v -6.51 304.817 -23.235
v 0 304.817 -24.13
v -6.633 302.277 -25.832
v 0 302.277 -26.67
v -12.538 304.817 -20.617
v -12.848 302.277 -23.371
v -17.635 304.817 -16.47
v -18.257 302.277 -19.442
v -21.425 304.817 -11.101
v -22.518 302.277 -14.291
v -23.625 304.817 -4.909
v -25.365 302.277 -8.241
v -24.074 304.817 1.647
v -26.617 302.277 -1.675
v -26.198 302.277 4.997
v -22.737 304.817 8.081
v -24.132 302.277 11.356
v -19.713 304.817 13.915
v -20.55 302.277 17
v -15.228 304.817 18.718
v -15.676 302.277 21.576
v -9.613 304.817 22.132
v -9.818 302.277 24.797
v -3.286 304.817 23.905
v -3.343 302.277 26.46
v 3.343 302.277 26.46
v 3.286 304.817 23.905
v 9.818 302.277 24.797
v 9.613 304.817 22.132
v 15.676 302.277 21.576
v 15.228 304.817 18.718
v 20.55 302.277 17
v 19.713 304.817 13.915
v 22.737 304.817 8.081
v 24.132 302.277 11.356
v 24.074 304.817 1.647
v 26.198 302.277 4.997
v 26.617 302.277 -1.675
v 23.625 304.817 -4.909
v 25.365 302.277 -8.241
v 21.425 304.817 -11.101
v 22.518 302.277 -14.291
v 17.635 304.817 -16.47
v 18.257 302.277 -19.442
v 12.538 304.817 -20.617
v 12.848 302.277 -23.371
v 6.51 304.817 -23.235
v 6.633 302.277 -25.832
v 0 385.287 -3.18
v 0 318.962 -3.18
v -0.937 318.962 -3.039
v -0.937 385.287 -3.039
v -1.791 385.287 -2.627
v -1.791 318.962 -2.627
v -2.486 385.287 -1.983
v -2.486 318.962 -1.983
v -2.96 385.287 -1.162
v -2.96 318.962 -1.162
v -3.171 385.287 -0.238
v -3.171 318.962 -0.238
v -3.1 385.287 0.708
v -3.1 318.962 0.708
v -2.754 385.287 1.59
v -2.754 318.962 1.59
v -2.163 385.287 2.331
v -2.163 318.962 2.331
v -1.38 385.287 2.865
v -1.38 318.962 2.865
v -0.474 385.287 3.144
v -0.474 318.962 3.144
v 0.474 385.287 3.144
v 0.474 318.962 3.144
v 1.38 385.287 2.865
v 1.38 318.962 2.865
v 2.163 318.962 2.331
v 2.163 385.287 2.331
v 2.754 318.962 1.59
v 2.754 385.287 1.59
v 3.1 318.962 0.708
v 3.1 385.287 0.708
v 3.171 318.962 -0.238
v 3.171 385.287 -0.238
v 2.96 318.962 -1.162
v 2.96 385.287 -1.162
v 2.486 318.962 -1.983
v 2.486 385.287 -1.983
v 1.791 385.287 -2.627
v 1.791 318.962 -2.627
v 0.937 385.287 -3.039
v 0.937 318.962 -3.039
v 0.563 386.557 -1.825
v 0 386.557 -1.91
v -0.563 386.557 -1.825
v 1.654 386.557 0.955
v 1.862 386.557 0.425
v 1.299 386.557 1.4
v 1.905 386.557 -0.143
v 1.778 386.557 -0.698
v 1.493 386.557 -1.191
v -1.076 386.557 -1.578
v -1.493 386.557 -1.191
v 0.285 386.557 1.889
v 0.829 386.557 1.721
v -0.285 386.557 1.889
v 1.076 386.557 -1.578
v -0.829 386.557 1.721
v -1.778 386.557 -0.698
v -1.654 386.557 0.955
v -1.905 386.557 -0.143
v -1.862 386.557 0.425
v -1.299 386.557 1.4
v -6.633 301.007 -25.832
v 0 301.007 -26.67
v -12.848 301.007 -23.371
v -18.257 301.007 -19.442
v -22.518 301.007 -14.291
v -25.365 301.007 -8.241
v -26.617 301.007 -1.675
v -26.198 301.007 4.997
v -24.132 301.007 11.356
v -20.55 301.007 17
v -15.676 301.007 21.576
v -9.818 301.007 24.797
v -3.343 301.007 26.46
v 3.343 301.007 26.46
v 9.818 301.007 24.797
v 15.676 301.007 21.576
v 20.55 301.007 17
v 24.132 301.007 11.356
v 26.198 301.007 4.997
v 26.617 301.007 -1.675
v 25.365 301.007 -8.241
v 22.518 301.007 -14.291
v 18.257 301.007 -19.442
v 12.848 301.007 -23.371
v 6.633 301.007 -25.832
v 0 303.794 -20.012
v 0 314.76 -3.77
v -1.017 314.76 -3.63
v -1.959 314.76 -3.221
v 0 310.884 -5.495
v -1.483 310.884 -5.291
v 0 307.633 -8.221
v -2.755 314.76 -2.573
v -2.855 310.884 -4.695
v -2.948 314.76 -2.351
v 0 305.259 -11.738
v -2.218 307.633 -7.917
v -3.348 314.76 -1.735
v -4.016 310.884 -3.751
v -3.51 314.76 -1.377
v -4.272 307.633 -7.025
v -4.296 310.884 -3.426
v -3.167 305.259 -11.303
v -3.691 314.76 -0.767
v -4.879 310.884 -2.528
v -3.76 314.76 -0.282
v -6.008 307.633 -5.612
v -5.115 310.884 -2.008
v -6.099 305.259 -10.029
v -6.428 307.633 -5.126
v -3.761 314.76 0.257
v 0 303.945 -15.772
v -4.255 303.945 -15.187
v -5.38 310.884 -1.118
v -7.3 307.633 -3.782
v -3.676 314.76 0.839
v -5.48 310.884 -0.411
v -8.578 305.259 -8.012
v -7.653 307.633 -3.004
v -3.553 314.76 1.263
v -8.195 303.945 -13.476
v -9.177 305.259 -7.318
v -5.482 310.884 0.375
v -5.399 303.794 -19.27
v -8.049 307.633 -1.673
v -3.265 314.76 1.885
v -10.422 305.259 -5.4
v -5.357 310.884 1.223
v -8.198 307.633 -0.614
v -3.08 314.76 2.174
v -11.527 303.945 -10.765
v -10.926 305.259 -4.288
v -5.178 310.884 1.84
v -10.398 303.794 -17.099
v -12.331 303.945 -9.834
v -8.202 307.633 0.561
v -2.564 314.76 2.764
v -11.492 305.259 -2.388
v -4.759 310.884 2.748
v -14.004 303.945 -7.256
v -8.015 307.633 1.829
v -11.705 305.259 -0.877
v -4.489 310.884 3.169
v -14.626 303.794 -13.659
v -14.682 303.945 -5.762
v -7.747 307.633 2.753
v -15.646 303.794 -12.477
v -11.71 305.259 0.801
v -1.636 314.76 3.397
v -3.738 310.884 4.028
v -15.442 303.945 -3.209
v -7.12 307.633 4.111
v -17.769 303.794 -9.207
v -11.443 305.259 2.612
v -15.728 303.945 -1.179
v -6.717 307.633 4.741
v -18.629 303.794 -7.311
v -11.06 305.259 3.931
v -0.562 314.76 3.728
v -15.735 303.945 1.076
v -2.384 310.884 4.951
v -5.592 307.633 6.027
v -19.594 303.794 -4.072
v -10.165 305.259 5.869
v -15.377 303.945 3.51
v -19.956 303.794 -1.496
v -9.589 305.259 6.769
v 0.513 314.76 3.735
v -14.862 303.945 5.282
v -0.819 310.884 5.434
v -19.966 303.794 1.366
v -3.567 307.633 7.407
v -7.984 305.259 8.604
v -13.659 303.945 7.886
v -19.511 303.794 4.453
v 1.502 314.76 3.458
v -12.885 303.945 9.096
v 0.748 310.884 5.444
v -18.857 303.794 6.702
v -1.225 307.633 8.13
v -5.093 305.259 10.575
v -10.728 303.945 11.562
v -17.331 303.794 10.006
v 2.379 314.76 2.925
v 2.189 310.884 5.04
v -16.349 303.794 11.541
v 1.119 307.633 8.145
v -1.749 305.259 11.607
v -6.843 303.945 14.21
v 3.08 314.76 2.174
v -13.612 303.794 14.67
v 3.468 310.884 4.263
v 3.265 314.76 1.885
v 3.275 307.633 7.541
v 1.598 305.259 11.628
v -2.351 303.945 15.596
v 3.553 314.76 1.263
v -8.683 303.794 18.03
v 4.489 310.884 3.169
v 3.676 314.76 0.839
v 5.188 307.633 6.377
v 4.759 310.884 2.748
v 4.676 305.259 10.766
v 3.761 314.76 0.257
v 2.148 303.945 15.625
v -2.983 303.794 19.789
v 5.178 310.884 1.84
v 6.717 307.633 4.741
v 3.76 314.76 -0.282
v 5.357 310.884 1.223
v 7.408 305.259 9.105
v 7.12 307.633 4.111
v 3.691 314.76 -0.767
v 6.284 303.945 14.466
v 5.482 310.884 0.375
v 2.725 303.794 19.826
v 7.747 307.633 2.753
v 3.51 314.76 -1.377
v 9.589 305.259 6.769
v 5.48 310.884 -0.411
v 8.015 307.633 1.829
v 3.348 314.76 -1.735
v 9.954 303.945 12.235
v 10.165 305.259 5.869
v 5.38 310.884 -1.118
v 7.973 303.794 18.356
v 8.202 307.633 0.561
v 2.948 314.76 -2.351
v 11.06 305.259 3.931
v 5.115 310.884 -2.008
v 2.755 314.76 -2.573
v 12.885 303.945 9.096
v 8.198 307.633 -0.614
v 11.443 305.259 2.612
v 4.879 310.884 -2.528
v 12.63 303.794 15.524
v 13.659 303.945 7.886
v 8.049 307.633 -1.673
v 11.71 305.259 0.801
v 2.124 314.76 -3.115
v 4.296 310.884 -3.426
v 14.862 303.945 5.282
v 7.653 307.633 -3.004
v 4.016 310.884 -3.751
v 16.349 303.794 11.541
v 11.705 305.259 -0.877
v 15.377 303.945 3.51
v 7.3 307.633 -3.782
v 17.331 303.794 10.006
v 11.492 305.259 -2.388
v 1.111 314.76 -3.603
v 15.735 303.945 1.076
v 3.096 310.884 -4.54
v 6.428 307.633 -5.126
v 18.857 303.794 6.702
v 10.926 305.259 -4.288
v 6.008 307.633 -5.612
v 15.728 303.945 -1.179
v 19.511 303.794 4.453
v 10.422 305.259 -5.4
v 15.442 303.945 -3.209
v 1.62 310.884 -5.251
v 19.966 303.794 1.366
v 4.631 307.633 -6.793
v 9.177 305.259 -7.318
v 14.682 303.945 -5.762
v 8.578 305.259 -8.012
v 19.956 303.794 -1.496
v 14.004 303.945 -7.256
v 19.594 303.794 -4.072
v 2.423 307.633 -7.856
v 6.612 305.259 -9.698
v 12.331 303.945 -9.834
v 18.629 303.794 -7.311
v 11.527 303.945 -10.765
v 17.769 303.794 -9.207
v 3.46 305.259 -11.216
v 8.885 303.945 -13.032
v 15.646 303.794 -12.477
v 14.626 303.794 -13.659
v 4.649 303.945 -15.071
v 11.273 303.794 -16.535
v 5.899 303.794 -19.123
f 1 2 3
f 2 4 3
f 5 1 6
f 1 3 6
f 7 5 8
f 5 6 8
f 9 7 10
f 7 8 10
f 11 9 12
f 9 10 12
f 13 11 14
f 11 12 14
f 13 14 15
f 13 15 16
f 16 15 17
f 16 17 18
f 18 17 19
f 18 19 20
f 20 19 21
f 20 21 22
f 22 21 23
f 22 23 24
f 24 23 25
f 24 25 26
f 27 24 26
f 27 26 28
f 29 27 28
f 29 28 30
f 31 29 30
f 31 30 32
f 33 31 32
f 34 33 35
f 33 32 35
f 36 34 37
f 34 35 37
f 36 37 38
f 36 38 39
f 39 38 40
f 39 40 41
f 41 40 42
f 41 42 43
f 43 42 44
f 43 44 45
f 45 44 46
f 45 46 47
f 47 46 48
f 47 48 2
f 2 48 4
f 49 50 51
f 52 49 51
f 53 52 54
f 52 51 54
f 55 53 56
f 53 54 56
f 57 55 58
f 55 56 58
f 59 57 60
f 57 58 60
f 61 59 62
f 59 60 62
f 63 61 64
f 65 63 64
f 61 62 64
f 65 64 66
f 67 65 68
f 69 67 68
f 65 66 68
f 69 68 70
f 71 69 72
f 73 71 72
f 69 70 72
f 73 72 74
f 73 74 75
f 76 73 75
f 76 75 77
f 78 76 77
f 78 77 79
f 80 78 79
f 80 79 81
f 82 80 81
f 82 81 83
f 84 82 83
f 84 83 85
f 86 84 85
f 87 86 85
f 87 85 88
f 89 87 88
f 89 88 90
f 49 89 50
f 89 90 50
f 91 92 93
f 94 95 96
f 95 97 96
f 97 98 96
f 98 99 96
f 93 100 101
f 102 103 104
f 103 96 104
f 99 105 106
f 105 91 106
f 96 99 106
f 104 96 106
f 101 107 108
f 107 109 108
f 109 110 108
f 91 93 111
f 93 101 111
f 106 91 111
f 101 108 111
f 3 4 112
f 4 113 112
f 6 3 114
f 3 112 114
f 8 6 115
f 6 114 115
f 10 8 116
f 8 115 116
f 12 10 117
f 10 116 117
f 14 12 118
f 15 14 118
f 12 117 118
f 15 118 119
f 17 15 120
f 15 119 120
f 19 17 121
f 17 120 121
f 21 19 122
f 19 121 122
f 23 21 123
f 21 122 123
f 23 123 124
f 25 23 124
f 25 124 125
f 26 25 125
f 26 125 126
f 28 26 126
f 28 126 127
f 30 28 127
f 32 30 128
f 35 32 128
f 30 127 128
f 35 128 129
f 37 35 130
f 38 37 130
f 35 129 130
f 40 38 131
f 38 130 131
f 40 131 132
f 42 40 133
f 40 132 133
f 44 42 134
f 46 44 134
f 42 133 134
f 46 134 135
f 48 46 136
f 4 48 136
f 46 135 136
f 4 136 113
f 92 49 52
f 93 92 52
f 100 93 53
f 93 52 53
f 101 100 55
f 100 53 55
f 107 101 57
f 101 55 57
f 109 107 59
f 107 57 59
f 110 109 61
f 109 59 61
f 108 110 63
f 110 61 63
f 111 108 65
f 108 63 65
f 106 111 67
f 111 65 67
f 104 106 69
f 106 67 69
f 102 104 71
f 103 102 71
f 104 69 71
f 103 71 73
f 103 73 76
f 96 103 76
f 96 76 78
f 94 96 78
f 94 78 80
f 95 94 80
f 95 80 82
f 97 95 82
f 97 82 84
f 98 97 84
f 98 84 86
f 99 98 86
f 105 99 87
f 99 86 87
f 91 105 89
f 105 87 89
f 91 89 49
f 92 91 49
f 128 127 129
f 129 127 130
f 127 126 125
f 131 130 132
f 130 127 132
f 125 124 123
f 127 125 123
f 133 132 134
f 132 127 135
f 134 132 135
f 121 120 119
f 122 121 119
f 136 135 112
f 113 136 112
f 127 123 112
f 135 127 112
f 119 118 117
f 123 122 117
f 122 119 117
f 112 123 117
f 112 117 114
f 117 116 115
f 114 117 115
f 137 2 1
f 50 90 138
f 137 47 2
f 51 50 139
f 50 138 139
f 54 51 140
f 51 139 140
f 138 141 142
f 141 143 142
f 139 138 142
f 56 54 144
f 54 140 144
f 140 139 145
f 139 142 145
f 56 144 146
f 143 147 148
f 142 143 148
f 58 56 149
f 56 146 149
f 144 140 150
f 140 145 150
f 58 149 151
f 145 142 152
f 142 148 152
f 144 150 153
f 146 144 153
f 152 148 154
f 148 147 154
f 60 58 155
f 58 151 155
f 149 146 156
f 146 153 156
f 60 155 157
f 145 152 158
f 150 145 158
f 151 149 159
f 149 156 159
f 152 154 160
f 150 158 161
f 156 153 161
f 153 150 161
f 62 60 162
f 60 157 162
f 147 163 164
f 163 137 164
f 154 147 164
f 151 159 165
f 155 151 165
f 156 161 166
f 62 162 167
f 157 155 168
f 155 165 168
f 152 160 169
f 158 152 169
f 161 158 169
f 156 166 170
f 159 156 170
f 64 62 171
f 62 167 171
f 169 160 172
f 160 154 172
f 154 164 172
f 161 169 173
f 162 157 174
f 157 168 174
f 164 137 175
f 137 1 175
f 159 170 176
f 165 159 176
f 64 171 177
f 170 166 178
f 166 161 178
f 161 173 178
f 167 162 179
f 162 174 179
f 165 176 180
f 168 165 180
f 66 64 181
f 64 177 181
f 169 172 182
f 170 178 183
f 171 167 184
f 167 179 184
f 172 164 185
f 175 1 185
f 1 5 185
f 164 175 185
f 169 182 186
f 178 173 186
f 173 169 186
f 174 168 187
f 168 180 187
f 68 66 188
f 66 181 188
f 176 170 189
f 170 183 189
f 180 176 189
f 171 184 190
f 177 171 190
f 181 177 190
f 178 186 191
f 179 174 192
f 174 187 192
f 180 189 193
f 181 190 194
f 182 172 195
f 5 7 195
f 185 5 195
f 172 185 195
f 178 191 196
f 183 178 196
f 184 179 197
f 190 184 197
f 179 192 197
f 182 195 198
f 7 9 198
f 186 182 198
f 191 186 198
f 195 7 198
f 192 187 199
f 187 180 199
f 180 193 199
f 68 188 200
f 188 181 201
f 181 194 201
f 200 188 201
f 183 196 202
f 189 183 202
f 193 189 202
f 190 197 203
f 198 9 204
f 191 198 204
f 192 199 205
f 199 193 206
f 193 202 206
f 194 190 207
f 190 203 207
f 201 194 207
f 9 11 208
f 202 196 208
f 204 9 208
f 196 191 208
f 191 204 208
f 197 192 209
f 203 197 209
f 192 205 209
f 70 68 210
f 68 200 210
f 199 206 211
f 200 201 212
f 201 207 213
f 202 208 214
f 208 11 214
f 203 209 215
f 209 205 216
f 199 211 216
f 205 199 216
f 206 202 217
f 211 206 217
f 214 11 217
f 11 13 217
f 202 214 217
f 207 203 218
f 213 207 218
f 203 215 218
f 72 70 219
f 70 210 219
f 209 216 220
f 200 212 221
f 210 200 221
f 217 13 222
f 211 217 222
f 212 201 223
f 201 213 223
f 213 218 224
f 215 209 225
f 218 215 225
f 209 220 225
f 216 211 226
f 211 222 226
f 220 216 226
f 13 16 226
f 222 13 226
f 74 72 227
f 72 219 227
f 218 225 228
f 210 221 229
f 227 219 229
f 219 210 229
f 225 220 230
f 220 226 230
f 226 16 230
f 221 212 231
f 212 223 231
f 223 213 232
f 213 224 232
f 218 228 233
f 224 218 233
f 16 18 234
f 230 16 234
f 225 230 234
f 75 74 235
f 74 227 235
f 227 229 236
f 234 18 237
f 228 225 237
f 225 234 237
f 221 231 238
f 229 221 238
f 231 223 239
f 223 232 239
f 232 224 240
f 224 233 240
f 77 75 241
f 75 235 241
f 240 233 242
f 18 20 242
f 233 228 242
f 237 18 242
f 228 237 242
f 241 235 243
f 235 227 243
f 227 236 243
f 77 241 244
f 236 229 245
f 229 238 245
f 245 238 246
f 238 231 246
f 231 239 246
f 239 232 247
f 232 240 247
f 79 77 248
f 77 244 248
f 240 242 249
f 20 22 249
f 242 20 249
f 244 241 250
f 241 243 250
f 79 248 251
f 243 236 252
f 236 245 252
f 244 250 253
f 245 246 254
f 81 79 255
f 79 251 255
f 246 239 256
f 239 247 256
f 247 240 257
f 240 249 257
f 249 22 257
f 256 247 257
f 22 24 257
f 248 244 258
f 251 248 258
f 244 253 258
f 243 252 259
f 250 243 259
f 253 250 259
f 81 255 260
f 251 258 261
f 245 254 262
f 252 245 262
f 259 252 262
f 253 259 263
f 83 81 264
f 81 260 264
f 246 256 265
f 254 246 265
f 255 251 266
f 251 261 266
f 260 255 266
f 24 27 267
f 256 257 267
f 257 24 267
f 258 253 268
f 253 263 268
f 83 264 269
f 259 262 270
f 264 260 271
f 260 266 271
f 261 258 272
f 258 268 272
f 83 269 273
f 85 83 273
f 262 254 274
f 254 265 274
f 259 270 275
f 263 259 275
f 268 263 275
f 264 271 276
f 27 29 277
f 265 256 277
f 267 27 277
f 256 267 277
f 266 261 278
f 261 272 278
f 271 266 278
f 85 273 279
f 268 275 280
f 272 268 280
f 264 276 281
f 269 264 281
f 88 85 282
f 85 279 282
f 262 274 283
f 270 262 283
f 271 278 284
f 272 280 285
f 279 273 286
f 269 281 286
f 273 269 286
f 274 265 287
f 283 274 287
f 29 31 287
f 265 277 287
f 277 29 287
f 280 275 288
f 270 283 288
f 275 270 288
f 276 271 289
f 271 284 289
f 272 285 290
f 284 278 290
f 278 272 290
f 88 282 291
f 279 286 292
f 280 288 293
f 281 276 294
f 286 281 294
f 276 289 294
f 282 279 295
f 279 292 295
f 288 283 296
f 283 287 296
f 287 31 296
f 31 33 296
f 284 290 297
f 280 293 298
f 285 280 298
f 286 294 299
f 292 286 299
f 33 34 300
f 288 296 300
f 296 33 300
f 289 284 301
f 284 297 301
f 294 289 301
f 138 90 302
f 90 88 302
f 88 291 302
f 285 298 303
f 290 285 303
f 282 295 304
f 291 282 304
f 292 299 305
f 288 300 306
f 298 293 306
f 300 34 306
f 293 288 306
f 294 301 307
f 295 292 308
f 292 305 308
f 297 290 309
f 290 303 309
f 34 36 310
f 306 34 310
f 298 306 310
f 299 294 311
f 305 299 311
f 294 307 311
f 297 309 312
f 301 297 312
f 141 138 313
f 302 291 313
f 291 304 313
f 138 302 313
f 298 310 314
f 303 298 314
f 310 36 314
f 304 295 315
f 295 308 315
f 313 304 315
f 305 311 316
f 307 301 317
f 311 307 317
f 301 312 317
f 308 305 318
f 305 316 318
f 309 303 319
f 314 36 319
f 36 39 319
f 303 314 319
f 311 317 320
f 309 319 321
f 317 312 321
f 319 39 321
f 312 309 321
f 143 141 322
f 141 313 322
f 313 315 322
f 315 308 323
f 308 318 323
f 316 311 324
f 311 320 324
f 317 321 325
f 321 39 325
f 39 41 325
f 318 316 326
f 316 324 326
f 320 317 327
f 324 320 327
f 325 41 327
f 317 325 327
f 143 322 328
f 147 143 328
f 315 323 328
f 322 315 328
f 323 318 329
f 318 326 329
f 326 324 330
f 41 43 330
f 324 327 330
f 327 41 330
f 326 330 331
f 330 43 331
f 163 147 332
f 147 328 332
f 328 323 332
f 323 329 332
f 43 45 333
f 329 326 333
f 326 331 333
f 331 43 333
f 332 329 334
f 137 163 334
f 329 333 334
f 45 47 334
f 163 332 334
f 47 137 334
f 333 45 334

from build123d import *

# Parameters (mm, degrees)
CHAMFER1_SIZE = 32.258
SCALE1_SCALE  = 0.039370079


with BuildPart() as part:
    # Sketch1 → Revolve1 (revolve)
    with BuildSketch(Plane(origin=(0, 0, 0), x_dir=(0, 0, -1), z_dir=(1, 0, 0))):
        with BuildLine():
            Line((0, 0), (0, 2172.97))
            Line((0, 2172.97), (80.772, 2172.97))
            Line((80.772, 2172.97), (80.772, 456.0493458))
            ThreePointArc((80.772, 456.0493458), (251.373886398, 135.019319557), (612.902, 96.774))
            Line((612.902, 96.774), (677.418, 32.258))
            Line((677.418, 32.258), (677.418, 0))
            Line((677.418, 0), (0, 0))
        make_face()
    revolve(axis=Axis((0, 0, 0), (0, 1, 0)))

    # Chamfer1
    chamfer1_edges = [part.edges().sort_by_distance(p)[0] for p in [
        (0, 2172.97, 80.772),
    ]]
    chamfer(chamfer1_edges, length=CHAMFER1_SIZE)


with BuildPart() as part_1:
    # Scale1: scaled about (0, 313.343453497, 0)
    add(part.part.scale(SCALE1_SCALE).moved(Location((0, 301.00709706, 0))))


solid = part_1.part
